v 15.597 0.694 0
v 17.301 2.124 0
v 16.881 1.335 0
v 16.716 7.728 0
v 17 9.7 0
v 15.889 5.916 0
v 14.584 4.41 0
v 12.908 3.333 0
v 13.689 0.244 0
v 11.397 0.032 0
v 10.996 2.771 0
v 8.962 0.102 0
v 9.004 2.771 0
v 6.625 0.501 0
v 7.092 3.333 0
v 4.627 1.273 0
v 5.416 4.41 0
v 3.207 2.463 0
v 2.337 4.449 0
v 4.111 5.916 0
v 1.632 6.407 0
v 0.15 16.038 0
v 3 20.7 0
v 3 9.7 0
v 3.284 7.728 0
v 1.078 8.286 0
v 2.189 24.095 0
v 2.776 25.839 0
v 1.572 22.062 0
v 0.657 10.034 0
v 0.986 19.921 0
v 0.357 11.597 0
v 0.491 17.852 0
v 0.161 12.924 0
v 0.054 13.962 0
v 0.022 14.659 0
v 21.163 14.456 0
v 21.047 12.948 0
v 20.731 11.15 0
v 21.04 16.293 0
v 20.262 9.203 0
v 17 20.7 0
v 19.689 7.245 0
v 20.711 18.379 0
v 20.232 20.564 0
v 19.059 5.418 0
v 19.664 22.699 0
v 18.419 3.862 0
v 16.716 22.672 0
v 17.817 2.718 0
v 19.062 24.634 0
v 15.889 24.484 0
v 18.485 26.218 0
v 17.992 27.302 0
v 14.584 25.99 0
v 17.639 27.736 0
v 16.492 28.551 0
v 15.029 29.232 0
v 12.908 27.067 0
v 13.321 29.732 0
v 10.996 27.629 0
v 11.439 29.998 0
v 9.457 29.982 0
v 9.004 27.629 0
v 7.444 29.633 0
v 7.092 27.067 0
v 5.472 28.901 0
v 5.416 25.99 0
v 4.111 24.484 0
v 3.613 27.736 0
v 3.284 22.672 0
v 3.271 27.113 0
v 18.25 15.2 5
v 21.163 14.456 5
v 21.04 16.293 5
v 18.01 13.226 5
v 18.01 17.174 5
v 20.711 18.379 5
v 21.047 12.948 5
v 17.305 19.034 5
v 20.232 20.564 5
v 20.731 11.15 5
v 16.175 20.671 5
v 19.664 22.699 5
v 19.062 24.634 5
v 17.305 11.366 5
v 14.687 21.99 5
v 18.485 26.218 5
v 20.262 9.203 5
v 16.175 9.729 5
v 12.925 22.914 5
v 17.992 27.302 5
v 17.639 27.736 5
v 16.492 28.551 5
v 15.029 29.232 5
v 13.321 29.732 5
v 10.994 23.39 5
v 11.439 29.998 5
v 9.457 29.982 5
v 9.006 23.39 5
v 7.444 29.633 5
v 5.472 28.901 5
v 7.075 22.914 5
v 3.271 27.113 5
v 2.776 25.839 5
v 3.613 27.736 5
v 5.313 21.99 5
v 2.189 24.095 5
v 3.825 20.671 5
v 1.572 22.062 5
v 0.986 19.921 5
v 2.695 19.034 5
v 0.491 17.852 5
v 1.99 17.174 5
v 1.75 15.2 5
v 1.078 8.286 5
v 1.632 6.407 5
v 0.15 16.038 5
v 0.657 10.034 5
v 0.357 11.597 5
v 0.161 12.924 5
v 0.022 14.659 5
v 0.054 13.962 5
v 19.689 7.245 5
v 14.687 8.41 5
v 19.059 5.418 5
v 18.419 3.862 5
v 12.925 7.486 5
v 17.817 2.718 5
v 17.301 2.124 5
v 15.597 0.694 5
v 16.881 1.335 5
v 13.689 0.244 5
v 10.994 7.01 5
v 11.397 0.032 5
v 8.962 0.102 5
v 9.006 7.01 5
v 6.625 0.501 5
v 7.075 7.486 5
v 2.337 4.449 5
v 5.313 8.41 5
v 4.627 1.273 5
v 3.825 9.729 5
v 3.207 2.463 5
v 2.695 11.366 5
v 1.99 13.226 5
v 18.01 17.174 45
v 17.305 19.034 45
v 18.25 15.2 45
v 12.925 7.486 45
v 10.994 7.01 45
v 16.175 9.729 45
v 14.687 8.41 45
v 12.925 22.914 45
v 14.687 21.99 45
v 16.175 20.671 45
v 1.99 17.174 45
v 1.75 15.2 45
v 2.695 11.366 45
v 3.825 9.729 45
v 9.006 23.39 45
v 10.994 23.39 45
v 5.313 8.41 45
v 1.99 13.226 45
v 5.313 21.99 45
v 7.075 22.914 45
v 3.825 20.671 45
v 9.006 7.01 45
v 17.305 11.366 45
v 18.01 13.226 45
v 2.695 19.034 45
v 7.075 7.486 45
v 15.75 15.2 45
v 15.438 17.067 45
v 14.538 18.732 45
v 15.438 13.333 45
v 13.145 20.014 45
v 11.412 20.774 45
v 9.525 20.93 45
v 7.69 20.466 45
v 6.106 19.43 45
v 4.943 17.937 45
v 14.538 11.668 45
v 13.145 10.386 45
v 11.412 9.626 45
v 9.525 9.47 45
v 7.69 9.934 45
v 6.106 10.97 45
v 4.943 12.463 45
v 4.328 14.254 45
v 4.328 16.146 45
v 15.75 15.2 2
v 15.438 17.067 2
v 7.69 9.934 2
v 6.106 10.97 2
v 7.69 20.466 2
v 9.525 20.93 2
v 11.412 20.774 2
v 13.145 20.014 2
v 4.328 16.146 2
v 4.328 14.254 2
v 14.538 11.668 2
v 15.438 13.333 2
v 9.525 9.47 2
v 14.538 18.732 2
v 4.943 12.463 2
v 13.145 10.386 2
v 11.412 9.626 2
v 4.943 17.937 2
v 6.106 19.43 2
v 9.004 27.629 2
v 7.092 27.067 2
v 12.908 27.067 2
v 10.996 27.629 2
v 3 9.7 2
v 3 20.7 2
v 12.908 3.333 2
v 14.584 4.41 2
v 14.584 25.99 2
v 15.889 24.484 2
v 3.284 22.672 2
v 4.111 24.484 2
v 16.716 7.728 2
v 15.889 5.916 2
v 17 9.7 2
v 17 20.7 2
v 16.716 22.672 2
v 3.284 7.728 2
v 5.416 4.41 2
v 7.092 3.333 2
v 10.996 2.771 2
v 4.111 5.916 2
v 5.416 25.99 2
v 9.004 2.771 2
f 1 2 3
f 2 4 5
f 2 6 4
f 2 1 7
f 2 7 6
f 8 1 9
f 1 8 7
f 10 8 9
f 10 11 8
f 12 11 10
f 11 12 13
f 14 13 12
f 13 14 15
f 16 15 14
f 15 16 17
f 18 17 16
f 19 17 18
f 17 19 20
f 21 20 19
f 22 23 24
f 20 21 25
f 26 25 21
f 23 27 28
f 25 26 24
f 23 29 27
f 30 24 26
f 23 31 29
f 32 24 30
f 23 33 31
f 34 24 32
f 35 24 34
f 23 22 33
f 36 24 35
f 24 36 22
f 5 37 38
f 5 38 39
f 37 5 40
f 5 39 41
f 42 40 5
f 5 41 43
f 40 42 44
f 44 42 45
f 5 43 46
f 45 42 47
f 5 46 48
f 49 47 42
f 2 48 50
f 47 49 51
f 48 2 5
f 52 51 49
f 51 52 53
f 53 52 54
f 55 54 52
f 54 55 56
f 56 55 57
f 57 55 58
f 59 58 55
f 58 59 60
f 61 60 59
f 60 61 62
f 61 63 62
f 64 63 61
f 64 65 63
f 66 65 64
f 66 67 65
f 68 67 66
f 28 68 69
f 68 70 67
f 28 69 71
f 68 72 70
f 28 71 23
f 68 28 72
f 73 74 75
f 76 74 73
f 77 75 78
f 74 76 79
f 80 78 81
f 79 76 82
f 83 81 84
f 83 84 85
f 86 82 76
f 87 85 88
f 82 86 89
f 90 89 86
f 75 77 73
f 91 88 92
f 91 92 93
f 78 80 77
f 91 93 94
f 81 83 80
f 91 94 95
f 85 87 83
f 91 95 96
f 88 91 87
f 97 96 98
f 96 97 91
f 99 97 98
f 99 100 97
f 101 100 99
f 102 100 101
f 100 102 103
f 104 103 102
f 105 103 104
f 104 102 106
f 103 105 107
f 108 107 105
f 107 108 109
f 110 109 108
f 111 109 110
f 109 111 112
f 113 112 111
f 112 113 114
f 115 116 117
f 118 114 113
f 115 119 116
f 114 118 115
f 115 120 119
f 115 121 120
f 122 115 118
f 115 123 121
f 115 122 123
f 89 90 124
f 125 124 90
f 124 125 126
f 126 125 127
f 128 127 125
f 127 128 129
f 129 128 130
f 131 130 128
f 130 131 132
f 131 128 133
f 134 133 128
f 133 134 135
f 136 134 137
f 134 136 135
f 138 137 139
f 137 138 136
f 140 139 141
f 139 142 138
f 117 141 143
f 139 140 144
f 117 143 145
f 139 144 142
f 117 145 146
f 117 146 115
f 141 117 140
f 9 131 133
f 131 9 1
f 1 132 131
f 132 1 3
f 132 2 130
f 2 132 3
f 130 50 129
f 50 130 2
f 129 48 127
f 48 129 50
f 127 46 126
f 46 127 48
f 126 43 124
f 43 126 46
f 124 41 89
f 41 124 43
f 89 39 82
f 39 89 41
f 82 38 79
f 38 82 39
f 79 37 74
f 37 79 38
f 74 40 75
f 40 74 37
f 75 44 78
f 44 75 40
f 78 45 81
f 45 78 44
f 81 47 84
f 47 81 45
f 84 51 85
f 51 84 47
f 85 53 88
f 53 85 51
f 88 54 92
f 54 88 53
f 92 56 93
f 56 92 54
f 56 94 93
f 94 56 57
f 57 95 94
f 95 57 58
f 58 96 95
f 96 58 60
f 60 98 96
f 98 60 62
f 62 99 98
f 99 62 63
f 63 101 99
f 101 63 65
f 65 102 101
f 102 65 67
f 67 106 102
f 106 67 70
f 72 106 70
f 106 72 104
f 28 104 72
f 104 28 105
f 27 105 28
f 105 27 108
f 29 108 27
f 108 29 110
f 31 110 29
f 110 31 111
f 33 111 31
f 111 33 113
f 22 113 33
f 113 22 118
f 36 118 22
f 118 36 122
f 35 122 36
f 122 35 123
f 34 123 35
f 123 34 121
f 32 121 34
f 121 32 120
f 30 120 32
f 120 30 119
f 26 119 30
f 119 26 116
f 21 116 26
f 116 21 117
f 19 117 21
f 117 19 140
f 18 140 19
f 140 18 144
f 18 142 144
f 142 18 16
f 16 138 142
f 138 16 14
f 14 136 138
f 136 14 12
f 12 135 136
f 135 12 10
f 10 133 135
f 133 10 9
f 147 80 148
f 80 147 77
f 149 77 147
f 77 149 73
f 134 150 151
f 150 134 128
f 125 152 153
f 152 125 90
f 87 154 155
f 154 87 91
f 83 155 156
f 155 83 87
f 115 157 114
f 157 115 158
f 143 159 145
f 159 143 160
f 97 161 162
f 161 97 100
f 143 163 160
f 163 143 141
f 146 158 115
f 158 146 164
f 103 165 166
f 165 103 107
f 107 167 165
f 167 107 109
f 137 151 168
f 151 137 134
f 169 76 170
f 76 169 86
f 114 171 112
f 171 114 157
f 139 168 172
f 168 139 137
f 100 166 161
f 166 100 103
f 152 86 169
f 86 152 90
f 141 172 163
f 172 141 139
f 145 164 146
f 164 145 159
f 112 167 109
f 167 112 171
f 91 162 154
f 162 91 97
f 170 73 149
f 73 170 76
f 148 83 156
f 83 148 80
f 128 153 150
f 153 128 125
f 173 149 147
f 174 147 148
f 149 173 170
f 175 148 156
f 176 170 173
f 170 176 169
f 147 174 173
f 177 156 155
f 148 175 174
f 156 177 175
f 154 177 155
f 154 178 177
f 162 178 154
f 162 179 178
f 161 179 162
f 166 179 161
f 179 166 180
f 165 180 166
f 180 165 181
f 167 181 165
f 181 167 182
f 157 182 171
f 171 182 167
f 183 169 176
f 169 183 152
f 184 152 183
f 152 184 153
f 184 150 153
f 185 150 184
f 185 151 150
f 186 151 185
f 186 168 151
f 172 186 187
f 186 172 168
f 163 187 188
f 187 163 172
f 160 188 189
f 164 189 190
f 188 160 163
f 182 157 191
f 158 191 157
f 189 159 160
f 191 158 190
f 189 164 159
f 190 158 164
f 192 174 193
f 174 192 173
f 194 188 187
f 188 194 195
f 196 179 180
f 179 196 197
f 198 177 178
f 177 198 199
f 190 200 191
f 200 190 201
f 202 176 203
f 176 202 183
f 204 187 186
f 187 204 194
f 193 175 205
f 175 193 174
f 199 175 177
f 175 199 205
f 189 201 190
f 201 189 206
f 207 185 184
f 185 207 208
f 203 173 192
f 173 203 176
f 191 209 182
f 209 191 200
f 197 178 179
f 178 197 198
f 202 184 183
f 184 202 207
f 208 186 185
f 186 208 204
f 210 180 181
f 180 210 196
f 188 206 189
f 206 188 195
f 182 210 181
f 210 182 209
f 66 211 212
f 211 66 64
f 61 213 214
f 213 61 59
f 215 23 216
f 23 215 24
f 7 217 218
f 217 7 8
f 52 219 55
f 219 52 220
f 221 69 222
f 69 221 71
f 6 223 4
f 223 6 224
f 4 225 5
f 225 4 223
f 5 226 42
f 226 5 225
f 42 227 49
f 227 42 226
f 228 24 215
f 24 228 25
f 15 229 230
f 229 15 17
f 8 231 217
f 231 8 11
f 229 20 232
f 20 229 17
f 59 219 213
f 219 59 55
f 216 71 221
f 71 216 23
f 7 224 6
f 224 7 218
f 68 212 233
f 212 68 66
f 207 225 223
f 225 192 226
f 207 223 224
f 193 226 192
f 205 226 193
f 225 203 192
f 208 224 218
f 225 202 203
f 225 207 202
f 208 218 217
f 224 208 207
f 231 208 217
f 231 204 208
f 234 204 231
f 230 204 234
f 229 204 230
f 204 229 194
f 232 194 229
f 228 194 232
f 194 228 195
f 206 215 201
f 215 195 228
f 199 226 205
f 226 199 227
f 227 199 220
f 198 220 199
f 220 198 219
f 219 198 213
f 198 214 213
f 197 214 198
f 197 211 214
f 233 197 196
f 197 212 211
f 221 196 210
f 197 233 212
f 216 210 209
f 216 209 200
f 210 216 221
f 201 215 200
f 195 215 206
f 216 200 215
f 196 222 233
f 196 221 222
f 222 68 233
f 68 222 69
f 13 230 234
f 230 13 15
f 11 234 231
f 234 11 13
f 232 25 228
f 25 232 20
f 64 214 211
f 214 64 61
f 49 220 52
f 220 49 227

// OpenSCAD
difference()
{

union(){


scale([0.153,0.153,1])linear_extrude(height=5)import("syringe.dxf");
translate([10,15.2,0])cylinder(r=16.5/2,h=45);

}
translate([10,15.2,-1])cylinder(r=11.5/2,h=55);

hull(){translate([10,15.2-5.5,-1])cylinder(r=7,h=3);
translate([10,15.2+5.5,-1])cylinder(r=7,h=3);}
}
